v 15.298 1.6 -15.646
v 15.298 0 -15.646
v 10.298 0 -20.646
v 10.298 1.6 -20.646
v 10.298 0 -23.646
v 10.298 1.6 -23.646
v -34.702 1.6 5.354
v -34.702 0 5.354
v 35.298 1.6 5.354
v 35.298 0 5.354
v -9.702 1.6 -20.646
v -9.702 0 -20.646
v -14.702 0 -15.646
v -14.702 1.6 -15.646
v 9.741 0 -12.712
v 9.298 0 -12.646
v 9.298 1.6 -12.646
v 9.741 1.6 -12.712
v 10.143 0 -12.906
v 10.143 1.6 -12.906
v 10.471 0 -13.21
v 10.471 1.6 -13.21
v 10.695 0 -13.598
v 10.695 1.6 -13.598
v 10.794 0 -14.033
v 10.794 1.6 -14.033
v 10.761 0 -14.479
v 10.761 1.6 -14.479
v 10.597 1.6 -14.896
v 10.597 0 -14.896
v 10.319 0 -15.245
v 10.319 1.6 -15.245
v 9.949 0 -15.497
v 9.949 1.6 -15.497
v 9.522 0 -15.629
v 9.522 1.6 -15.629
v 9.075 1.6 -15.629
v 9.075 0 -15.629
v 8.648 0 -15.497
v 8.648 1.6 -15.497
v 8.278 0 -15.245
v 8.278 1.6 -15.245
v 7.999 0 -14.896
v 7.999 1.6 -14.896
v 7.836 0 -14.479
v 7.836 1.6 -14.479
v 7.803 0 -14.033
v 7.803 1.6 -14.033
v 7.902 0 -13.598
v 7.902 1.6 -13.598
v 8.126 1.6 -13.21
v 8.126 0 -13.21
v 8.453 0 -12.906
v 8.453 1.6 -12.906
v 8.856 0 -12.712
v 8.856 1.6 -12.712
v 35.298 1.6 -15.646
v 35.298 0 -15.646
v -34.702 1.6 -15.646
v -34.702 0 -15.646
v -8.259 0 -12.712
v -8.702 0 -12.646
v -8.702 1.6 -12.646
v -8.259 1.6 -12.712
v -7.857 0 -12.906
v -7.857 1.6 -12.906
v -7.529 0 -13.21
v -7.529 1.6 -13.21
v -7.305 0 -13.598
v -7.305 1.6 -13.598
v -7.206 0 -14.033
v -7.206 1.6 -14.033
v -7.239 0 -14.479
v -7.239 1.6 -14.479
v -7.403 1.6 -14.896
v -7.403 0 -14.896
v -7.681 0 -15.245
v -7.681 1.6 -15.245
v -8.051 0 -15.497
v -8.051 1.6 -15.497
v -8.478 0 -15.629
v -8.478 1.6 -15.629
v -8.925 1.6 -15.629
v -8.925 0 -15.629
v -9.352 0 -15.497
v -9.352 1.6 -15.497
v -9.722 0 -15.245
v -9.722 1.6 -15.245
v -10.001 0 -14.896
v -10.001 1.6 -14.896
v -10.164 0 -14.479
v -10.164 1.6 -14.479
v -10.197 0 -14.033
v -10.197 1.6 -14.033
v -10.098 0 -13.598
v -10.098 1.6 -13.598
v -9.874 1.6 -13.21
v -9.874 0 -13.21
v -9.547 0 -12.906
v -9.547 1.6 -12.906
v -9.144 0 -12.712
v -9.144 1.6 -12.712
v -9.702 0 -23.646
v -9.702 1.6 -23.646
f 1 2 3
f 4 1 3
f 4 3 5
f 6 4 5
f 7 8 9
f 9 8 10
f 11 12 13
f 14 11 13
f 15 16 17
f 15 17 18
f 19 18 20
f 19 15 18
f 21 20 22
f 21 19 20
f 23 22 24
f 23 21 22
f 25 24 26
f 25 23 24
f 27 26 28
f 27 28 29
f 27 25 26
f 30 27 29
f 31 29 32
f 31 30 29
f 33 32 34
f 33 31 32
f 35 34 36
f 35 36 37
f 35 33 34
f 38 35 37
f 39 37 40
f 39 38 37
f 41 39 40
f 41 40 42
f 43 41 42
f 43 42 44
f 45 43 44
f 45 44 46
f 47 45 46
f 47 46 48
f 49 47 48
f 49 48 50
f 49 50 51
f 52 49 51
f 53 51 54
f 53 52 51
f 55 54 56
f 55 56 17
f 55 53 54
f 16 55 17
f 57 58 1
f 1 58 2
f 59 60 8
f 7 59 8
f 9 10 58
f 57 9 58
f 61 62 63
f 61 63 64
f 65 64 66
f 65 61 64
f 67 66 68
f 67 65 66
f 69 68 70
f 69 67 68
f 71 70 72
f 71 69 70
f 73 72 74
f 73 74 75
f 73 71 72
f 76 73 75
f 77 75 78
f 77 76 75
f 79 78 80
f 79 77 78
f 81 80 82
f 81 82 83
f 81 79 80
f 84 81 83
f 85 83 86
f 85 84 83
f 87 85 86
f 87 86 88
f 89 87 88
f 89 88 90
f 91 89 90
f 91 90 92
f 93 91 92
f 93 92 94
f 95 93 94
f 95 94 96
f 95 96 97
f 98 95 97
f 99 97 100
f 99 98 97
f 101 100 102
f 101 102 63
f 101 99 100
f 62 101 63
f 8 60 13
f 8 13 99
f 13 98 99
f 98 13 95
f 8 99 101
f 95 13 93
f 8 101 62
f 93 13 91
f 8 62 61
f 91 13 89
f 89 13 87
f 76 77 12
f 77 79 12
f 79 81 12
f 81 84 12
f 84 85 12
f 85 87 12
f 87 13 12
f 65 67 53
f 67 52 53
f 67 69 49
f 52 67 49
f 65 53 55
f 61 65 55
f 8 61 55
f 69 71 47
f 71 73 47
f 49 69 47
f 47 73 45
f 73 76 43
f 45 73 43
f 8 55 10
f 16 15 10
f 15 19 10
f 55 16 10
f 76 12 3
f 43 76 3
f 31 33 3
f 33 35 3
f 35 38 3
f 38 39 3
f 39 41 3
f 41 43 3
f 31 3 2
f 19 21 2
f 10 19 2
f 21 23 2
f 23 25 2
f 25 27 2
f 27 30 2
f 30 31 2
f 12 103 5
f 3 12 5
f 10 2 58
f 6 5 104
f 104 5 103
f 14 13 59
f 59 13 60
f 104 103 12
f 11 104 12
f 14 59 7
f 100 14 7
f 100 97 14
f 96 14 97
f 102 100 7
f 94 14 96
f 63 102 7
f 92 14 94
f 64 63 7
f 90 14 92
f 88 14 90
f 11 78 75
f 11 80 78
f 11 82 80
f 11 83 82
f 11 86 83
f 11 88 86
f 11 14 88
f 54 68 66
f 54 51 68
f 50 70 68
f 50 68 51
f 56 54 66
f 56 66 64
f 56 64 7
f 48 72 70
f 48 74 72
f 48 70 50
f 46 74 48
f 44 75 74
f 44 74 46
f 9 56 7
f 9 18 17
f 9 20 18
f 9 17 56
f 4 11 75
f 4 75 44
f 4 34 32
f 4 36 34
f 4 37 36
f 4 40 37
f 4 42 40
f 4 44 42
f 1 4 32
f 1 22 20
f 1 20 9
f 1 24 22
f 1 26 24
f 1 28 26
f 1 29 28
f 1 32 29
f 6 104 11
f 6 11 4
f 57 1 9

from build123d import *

# Parameters (mm, degrees)
SKETCH_1_R      = 1.5
EXTRUDE_1_DEPTH = 1.6


with BuildPart() as part:
    # 草图1 → 凸台-拉伸1 (new body)
    with BuildSketch(Plane(origin=(0, 0, 0), x_dir=(1, 0, 0), z_dir=(0, 1, 0))):
        Polygon((-9.701583435, 20.645554202), (-14.701583435, 15.645554202), (-34.701583435, 15.645554202), (-34.701583435, -5.354445798), (35.298416565, -5.354445798), (35.298416565, 15.645554202), (15.298416565, 15.645554202), (10.298416565, 20.645554202), (10.298416565, 23.645554202), (-9.701583435, 23.645554202), align=None)
        with Locations(Location((-8.701583435, 14.145554202, 0), (0, 0, 270))):
            Circle(SKETCH_1_R, mode=Mode.SUBTRACT)
        with Locations(Location((9.298416565, 14.145554202, 0), (0, 0, 270))):
            Circle(SKETCH_1_R, mode=Mode.SUBTRACT)
    extrude(amount=EXTRUDE_1_DEPTH)


solid = part.part
